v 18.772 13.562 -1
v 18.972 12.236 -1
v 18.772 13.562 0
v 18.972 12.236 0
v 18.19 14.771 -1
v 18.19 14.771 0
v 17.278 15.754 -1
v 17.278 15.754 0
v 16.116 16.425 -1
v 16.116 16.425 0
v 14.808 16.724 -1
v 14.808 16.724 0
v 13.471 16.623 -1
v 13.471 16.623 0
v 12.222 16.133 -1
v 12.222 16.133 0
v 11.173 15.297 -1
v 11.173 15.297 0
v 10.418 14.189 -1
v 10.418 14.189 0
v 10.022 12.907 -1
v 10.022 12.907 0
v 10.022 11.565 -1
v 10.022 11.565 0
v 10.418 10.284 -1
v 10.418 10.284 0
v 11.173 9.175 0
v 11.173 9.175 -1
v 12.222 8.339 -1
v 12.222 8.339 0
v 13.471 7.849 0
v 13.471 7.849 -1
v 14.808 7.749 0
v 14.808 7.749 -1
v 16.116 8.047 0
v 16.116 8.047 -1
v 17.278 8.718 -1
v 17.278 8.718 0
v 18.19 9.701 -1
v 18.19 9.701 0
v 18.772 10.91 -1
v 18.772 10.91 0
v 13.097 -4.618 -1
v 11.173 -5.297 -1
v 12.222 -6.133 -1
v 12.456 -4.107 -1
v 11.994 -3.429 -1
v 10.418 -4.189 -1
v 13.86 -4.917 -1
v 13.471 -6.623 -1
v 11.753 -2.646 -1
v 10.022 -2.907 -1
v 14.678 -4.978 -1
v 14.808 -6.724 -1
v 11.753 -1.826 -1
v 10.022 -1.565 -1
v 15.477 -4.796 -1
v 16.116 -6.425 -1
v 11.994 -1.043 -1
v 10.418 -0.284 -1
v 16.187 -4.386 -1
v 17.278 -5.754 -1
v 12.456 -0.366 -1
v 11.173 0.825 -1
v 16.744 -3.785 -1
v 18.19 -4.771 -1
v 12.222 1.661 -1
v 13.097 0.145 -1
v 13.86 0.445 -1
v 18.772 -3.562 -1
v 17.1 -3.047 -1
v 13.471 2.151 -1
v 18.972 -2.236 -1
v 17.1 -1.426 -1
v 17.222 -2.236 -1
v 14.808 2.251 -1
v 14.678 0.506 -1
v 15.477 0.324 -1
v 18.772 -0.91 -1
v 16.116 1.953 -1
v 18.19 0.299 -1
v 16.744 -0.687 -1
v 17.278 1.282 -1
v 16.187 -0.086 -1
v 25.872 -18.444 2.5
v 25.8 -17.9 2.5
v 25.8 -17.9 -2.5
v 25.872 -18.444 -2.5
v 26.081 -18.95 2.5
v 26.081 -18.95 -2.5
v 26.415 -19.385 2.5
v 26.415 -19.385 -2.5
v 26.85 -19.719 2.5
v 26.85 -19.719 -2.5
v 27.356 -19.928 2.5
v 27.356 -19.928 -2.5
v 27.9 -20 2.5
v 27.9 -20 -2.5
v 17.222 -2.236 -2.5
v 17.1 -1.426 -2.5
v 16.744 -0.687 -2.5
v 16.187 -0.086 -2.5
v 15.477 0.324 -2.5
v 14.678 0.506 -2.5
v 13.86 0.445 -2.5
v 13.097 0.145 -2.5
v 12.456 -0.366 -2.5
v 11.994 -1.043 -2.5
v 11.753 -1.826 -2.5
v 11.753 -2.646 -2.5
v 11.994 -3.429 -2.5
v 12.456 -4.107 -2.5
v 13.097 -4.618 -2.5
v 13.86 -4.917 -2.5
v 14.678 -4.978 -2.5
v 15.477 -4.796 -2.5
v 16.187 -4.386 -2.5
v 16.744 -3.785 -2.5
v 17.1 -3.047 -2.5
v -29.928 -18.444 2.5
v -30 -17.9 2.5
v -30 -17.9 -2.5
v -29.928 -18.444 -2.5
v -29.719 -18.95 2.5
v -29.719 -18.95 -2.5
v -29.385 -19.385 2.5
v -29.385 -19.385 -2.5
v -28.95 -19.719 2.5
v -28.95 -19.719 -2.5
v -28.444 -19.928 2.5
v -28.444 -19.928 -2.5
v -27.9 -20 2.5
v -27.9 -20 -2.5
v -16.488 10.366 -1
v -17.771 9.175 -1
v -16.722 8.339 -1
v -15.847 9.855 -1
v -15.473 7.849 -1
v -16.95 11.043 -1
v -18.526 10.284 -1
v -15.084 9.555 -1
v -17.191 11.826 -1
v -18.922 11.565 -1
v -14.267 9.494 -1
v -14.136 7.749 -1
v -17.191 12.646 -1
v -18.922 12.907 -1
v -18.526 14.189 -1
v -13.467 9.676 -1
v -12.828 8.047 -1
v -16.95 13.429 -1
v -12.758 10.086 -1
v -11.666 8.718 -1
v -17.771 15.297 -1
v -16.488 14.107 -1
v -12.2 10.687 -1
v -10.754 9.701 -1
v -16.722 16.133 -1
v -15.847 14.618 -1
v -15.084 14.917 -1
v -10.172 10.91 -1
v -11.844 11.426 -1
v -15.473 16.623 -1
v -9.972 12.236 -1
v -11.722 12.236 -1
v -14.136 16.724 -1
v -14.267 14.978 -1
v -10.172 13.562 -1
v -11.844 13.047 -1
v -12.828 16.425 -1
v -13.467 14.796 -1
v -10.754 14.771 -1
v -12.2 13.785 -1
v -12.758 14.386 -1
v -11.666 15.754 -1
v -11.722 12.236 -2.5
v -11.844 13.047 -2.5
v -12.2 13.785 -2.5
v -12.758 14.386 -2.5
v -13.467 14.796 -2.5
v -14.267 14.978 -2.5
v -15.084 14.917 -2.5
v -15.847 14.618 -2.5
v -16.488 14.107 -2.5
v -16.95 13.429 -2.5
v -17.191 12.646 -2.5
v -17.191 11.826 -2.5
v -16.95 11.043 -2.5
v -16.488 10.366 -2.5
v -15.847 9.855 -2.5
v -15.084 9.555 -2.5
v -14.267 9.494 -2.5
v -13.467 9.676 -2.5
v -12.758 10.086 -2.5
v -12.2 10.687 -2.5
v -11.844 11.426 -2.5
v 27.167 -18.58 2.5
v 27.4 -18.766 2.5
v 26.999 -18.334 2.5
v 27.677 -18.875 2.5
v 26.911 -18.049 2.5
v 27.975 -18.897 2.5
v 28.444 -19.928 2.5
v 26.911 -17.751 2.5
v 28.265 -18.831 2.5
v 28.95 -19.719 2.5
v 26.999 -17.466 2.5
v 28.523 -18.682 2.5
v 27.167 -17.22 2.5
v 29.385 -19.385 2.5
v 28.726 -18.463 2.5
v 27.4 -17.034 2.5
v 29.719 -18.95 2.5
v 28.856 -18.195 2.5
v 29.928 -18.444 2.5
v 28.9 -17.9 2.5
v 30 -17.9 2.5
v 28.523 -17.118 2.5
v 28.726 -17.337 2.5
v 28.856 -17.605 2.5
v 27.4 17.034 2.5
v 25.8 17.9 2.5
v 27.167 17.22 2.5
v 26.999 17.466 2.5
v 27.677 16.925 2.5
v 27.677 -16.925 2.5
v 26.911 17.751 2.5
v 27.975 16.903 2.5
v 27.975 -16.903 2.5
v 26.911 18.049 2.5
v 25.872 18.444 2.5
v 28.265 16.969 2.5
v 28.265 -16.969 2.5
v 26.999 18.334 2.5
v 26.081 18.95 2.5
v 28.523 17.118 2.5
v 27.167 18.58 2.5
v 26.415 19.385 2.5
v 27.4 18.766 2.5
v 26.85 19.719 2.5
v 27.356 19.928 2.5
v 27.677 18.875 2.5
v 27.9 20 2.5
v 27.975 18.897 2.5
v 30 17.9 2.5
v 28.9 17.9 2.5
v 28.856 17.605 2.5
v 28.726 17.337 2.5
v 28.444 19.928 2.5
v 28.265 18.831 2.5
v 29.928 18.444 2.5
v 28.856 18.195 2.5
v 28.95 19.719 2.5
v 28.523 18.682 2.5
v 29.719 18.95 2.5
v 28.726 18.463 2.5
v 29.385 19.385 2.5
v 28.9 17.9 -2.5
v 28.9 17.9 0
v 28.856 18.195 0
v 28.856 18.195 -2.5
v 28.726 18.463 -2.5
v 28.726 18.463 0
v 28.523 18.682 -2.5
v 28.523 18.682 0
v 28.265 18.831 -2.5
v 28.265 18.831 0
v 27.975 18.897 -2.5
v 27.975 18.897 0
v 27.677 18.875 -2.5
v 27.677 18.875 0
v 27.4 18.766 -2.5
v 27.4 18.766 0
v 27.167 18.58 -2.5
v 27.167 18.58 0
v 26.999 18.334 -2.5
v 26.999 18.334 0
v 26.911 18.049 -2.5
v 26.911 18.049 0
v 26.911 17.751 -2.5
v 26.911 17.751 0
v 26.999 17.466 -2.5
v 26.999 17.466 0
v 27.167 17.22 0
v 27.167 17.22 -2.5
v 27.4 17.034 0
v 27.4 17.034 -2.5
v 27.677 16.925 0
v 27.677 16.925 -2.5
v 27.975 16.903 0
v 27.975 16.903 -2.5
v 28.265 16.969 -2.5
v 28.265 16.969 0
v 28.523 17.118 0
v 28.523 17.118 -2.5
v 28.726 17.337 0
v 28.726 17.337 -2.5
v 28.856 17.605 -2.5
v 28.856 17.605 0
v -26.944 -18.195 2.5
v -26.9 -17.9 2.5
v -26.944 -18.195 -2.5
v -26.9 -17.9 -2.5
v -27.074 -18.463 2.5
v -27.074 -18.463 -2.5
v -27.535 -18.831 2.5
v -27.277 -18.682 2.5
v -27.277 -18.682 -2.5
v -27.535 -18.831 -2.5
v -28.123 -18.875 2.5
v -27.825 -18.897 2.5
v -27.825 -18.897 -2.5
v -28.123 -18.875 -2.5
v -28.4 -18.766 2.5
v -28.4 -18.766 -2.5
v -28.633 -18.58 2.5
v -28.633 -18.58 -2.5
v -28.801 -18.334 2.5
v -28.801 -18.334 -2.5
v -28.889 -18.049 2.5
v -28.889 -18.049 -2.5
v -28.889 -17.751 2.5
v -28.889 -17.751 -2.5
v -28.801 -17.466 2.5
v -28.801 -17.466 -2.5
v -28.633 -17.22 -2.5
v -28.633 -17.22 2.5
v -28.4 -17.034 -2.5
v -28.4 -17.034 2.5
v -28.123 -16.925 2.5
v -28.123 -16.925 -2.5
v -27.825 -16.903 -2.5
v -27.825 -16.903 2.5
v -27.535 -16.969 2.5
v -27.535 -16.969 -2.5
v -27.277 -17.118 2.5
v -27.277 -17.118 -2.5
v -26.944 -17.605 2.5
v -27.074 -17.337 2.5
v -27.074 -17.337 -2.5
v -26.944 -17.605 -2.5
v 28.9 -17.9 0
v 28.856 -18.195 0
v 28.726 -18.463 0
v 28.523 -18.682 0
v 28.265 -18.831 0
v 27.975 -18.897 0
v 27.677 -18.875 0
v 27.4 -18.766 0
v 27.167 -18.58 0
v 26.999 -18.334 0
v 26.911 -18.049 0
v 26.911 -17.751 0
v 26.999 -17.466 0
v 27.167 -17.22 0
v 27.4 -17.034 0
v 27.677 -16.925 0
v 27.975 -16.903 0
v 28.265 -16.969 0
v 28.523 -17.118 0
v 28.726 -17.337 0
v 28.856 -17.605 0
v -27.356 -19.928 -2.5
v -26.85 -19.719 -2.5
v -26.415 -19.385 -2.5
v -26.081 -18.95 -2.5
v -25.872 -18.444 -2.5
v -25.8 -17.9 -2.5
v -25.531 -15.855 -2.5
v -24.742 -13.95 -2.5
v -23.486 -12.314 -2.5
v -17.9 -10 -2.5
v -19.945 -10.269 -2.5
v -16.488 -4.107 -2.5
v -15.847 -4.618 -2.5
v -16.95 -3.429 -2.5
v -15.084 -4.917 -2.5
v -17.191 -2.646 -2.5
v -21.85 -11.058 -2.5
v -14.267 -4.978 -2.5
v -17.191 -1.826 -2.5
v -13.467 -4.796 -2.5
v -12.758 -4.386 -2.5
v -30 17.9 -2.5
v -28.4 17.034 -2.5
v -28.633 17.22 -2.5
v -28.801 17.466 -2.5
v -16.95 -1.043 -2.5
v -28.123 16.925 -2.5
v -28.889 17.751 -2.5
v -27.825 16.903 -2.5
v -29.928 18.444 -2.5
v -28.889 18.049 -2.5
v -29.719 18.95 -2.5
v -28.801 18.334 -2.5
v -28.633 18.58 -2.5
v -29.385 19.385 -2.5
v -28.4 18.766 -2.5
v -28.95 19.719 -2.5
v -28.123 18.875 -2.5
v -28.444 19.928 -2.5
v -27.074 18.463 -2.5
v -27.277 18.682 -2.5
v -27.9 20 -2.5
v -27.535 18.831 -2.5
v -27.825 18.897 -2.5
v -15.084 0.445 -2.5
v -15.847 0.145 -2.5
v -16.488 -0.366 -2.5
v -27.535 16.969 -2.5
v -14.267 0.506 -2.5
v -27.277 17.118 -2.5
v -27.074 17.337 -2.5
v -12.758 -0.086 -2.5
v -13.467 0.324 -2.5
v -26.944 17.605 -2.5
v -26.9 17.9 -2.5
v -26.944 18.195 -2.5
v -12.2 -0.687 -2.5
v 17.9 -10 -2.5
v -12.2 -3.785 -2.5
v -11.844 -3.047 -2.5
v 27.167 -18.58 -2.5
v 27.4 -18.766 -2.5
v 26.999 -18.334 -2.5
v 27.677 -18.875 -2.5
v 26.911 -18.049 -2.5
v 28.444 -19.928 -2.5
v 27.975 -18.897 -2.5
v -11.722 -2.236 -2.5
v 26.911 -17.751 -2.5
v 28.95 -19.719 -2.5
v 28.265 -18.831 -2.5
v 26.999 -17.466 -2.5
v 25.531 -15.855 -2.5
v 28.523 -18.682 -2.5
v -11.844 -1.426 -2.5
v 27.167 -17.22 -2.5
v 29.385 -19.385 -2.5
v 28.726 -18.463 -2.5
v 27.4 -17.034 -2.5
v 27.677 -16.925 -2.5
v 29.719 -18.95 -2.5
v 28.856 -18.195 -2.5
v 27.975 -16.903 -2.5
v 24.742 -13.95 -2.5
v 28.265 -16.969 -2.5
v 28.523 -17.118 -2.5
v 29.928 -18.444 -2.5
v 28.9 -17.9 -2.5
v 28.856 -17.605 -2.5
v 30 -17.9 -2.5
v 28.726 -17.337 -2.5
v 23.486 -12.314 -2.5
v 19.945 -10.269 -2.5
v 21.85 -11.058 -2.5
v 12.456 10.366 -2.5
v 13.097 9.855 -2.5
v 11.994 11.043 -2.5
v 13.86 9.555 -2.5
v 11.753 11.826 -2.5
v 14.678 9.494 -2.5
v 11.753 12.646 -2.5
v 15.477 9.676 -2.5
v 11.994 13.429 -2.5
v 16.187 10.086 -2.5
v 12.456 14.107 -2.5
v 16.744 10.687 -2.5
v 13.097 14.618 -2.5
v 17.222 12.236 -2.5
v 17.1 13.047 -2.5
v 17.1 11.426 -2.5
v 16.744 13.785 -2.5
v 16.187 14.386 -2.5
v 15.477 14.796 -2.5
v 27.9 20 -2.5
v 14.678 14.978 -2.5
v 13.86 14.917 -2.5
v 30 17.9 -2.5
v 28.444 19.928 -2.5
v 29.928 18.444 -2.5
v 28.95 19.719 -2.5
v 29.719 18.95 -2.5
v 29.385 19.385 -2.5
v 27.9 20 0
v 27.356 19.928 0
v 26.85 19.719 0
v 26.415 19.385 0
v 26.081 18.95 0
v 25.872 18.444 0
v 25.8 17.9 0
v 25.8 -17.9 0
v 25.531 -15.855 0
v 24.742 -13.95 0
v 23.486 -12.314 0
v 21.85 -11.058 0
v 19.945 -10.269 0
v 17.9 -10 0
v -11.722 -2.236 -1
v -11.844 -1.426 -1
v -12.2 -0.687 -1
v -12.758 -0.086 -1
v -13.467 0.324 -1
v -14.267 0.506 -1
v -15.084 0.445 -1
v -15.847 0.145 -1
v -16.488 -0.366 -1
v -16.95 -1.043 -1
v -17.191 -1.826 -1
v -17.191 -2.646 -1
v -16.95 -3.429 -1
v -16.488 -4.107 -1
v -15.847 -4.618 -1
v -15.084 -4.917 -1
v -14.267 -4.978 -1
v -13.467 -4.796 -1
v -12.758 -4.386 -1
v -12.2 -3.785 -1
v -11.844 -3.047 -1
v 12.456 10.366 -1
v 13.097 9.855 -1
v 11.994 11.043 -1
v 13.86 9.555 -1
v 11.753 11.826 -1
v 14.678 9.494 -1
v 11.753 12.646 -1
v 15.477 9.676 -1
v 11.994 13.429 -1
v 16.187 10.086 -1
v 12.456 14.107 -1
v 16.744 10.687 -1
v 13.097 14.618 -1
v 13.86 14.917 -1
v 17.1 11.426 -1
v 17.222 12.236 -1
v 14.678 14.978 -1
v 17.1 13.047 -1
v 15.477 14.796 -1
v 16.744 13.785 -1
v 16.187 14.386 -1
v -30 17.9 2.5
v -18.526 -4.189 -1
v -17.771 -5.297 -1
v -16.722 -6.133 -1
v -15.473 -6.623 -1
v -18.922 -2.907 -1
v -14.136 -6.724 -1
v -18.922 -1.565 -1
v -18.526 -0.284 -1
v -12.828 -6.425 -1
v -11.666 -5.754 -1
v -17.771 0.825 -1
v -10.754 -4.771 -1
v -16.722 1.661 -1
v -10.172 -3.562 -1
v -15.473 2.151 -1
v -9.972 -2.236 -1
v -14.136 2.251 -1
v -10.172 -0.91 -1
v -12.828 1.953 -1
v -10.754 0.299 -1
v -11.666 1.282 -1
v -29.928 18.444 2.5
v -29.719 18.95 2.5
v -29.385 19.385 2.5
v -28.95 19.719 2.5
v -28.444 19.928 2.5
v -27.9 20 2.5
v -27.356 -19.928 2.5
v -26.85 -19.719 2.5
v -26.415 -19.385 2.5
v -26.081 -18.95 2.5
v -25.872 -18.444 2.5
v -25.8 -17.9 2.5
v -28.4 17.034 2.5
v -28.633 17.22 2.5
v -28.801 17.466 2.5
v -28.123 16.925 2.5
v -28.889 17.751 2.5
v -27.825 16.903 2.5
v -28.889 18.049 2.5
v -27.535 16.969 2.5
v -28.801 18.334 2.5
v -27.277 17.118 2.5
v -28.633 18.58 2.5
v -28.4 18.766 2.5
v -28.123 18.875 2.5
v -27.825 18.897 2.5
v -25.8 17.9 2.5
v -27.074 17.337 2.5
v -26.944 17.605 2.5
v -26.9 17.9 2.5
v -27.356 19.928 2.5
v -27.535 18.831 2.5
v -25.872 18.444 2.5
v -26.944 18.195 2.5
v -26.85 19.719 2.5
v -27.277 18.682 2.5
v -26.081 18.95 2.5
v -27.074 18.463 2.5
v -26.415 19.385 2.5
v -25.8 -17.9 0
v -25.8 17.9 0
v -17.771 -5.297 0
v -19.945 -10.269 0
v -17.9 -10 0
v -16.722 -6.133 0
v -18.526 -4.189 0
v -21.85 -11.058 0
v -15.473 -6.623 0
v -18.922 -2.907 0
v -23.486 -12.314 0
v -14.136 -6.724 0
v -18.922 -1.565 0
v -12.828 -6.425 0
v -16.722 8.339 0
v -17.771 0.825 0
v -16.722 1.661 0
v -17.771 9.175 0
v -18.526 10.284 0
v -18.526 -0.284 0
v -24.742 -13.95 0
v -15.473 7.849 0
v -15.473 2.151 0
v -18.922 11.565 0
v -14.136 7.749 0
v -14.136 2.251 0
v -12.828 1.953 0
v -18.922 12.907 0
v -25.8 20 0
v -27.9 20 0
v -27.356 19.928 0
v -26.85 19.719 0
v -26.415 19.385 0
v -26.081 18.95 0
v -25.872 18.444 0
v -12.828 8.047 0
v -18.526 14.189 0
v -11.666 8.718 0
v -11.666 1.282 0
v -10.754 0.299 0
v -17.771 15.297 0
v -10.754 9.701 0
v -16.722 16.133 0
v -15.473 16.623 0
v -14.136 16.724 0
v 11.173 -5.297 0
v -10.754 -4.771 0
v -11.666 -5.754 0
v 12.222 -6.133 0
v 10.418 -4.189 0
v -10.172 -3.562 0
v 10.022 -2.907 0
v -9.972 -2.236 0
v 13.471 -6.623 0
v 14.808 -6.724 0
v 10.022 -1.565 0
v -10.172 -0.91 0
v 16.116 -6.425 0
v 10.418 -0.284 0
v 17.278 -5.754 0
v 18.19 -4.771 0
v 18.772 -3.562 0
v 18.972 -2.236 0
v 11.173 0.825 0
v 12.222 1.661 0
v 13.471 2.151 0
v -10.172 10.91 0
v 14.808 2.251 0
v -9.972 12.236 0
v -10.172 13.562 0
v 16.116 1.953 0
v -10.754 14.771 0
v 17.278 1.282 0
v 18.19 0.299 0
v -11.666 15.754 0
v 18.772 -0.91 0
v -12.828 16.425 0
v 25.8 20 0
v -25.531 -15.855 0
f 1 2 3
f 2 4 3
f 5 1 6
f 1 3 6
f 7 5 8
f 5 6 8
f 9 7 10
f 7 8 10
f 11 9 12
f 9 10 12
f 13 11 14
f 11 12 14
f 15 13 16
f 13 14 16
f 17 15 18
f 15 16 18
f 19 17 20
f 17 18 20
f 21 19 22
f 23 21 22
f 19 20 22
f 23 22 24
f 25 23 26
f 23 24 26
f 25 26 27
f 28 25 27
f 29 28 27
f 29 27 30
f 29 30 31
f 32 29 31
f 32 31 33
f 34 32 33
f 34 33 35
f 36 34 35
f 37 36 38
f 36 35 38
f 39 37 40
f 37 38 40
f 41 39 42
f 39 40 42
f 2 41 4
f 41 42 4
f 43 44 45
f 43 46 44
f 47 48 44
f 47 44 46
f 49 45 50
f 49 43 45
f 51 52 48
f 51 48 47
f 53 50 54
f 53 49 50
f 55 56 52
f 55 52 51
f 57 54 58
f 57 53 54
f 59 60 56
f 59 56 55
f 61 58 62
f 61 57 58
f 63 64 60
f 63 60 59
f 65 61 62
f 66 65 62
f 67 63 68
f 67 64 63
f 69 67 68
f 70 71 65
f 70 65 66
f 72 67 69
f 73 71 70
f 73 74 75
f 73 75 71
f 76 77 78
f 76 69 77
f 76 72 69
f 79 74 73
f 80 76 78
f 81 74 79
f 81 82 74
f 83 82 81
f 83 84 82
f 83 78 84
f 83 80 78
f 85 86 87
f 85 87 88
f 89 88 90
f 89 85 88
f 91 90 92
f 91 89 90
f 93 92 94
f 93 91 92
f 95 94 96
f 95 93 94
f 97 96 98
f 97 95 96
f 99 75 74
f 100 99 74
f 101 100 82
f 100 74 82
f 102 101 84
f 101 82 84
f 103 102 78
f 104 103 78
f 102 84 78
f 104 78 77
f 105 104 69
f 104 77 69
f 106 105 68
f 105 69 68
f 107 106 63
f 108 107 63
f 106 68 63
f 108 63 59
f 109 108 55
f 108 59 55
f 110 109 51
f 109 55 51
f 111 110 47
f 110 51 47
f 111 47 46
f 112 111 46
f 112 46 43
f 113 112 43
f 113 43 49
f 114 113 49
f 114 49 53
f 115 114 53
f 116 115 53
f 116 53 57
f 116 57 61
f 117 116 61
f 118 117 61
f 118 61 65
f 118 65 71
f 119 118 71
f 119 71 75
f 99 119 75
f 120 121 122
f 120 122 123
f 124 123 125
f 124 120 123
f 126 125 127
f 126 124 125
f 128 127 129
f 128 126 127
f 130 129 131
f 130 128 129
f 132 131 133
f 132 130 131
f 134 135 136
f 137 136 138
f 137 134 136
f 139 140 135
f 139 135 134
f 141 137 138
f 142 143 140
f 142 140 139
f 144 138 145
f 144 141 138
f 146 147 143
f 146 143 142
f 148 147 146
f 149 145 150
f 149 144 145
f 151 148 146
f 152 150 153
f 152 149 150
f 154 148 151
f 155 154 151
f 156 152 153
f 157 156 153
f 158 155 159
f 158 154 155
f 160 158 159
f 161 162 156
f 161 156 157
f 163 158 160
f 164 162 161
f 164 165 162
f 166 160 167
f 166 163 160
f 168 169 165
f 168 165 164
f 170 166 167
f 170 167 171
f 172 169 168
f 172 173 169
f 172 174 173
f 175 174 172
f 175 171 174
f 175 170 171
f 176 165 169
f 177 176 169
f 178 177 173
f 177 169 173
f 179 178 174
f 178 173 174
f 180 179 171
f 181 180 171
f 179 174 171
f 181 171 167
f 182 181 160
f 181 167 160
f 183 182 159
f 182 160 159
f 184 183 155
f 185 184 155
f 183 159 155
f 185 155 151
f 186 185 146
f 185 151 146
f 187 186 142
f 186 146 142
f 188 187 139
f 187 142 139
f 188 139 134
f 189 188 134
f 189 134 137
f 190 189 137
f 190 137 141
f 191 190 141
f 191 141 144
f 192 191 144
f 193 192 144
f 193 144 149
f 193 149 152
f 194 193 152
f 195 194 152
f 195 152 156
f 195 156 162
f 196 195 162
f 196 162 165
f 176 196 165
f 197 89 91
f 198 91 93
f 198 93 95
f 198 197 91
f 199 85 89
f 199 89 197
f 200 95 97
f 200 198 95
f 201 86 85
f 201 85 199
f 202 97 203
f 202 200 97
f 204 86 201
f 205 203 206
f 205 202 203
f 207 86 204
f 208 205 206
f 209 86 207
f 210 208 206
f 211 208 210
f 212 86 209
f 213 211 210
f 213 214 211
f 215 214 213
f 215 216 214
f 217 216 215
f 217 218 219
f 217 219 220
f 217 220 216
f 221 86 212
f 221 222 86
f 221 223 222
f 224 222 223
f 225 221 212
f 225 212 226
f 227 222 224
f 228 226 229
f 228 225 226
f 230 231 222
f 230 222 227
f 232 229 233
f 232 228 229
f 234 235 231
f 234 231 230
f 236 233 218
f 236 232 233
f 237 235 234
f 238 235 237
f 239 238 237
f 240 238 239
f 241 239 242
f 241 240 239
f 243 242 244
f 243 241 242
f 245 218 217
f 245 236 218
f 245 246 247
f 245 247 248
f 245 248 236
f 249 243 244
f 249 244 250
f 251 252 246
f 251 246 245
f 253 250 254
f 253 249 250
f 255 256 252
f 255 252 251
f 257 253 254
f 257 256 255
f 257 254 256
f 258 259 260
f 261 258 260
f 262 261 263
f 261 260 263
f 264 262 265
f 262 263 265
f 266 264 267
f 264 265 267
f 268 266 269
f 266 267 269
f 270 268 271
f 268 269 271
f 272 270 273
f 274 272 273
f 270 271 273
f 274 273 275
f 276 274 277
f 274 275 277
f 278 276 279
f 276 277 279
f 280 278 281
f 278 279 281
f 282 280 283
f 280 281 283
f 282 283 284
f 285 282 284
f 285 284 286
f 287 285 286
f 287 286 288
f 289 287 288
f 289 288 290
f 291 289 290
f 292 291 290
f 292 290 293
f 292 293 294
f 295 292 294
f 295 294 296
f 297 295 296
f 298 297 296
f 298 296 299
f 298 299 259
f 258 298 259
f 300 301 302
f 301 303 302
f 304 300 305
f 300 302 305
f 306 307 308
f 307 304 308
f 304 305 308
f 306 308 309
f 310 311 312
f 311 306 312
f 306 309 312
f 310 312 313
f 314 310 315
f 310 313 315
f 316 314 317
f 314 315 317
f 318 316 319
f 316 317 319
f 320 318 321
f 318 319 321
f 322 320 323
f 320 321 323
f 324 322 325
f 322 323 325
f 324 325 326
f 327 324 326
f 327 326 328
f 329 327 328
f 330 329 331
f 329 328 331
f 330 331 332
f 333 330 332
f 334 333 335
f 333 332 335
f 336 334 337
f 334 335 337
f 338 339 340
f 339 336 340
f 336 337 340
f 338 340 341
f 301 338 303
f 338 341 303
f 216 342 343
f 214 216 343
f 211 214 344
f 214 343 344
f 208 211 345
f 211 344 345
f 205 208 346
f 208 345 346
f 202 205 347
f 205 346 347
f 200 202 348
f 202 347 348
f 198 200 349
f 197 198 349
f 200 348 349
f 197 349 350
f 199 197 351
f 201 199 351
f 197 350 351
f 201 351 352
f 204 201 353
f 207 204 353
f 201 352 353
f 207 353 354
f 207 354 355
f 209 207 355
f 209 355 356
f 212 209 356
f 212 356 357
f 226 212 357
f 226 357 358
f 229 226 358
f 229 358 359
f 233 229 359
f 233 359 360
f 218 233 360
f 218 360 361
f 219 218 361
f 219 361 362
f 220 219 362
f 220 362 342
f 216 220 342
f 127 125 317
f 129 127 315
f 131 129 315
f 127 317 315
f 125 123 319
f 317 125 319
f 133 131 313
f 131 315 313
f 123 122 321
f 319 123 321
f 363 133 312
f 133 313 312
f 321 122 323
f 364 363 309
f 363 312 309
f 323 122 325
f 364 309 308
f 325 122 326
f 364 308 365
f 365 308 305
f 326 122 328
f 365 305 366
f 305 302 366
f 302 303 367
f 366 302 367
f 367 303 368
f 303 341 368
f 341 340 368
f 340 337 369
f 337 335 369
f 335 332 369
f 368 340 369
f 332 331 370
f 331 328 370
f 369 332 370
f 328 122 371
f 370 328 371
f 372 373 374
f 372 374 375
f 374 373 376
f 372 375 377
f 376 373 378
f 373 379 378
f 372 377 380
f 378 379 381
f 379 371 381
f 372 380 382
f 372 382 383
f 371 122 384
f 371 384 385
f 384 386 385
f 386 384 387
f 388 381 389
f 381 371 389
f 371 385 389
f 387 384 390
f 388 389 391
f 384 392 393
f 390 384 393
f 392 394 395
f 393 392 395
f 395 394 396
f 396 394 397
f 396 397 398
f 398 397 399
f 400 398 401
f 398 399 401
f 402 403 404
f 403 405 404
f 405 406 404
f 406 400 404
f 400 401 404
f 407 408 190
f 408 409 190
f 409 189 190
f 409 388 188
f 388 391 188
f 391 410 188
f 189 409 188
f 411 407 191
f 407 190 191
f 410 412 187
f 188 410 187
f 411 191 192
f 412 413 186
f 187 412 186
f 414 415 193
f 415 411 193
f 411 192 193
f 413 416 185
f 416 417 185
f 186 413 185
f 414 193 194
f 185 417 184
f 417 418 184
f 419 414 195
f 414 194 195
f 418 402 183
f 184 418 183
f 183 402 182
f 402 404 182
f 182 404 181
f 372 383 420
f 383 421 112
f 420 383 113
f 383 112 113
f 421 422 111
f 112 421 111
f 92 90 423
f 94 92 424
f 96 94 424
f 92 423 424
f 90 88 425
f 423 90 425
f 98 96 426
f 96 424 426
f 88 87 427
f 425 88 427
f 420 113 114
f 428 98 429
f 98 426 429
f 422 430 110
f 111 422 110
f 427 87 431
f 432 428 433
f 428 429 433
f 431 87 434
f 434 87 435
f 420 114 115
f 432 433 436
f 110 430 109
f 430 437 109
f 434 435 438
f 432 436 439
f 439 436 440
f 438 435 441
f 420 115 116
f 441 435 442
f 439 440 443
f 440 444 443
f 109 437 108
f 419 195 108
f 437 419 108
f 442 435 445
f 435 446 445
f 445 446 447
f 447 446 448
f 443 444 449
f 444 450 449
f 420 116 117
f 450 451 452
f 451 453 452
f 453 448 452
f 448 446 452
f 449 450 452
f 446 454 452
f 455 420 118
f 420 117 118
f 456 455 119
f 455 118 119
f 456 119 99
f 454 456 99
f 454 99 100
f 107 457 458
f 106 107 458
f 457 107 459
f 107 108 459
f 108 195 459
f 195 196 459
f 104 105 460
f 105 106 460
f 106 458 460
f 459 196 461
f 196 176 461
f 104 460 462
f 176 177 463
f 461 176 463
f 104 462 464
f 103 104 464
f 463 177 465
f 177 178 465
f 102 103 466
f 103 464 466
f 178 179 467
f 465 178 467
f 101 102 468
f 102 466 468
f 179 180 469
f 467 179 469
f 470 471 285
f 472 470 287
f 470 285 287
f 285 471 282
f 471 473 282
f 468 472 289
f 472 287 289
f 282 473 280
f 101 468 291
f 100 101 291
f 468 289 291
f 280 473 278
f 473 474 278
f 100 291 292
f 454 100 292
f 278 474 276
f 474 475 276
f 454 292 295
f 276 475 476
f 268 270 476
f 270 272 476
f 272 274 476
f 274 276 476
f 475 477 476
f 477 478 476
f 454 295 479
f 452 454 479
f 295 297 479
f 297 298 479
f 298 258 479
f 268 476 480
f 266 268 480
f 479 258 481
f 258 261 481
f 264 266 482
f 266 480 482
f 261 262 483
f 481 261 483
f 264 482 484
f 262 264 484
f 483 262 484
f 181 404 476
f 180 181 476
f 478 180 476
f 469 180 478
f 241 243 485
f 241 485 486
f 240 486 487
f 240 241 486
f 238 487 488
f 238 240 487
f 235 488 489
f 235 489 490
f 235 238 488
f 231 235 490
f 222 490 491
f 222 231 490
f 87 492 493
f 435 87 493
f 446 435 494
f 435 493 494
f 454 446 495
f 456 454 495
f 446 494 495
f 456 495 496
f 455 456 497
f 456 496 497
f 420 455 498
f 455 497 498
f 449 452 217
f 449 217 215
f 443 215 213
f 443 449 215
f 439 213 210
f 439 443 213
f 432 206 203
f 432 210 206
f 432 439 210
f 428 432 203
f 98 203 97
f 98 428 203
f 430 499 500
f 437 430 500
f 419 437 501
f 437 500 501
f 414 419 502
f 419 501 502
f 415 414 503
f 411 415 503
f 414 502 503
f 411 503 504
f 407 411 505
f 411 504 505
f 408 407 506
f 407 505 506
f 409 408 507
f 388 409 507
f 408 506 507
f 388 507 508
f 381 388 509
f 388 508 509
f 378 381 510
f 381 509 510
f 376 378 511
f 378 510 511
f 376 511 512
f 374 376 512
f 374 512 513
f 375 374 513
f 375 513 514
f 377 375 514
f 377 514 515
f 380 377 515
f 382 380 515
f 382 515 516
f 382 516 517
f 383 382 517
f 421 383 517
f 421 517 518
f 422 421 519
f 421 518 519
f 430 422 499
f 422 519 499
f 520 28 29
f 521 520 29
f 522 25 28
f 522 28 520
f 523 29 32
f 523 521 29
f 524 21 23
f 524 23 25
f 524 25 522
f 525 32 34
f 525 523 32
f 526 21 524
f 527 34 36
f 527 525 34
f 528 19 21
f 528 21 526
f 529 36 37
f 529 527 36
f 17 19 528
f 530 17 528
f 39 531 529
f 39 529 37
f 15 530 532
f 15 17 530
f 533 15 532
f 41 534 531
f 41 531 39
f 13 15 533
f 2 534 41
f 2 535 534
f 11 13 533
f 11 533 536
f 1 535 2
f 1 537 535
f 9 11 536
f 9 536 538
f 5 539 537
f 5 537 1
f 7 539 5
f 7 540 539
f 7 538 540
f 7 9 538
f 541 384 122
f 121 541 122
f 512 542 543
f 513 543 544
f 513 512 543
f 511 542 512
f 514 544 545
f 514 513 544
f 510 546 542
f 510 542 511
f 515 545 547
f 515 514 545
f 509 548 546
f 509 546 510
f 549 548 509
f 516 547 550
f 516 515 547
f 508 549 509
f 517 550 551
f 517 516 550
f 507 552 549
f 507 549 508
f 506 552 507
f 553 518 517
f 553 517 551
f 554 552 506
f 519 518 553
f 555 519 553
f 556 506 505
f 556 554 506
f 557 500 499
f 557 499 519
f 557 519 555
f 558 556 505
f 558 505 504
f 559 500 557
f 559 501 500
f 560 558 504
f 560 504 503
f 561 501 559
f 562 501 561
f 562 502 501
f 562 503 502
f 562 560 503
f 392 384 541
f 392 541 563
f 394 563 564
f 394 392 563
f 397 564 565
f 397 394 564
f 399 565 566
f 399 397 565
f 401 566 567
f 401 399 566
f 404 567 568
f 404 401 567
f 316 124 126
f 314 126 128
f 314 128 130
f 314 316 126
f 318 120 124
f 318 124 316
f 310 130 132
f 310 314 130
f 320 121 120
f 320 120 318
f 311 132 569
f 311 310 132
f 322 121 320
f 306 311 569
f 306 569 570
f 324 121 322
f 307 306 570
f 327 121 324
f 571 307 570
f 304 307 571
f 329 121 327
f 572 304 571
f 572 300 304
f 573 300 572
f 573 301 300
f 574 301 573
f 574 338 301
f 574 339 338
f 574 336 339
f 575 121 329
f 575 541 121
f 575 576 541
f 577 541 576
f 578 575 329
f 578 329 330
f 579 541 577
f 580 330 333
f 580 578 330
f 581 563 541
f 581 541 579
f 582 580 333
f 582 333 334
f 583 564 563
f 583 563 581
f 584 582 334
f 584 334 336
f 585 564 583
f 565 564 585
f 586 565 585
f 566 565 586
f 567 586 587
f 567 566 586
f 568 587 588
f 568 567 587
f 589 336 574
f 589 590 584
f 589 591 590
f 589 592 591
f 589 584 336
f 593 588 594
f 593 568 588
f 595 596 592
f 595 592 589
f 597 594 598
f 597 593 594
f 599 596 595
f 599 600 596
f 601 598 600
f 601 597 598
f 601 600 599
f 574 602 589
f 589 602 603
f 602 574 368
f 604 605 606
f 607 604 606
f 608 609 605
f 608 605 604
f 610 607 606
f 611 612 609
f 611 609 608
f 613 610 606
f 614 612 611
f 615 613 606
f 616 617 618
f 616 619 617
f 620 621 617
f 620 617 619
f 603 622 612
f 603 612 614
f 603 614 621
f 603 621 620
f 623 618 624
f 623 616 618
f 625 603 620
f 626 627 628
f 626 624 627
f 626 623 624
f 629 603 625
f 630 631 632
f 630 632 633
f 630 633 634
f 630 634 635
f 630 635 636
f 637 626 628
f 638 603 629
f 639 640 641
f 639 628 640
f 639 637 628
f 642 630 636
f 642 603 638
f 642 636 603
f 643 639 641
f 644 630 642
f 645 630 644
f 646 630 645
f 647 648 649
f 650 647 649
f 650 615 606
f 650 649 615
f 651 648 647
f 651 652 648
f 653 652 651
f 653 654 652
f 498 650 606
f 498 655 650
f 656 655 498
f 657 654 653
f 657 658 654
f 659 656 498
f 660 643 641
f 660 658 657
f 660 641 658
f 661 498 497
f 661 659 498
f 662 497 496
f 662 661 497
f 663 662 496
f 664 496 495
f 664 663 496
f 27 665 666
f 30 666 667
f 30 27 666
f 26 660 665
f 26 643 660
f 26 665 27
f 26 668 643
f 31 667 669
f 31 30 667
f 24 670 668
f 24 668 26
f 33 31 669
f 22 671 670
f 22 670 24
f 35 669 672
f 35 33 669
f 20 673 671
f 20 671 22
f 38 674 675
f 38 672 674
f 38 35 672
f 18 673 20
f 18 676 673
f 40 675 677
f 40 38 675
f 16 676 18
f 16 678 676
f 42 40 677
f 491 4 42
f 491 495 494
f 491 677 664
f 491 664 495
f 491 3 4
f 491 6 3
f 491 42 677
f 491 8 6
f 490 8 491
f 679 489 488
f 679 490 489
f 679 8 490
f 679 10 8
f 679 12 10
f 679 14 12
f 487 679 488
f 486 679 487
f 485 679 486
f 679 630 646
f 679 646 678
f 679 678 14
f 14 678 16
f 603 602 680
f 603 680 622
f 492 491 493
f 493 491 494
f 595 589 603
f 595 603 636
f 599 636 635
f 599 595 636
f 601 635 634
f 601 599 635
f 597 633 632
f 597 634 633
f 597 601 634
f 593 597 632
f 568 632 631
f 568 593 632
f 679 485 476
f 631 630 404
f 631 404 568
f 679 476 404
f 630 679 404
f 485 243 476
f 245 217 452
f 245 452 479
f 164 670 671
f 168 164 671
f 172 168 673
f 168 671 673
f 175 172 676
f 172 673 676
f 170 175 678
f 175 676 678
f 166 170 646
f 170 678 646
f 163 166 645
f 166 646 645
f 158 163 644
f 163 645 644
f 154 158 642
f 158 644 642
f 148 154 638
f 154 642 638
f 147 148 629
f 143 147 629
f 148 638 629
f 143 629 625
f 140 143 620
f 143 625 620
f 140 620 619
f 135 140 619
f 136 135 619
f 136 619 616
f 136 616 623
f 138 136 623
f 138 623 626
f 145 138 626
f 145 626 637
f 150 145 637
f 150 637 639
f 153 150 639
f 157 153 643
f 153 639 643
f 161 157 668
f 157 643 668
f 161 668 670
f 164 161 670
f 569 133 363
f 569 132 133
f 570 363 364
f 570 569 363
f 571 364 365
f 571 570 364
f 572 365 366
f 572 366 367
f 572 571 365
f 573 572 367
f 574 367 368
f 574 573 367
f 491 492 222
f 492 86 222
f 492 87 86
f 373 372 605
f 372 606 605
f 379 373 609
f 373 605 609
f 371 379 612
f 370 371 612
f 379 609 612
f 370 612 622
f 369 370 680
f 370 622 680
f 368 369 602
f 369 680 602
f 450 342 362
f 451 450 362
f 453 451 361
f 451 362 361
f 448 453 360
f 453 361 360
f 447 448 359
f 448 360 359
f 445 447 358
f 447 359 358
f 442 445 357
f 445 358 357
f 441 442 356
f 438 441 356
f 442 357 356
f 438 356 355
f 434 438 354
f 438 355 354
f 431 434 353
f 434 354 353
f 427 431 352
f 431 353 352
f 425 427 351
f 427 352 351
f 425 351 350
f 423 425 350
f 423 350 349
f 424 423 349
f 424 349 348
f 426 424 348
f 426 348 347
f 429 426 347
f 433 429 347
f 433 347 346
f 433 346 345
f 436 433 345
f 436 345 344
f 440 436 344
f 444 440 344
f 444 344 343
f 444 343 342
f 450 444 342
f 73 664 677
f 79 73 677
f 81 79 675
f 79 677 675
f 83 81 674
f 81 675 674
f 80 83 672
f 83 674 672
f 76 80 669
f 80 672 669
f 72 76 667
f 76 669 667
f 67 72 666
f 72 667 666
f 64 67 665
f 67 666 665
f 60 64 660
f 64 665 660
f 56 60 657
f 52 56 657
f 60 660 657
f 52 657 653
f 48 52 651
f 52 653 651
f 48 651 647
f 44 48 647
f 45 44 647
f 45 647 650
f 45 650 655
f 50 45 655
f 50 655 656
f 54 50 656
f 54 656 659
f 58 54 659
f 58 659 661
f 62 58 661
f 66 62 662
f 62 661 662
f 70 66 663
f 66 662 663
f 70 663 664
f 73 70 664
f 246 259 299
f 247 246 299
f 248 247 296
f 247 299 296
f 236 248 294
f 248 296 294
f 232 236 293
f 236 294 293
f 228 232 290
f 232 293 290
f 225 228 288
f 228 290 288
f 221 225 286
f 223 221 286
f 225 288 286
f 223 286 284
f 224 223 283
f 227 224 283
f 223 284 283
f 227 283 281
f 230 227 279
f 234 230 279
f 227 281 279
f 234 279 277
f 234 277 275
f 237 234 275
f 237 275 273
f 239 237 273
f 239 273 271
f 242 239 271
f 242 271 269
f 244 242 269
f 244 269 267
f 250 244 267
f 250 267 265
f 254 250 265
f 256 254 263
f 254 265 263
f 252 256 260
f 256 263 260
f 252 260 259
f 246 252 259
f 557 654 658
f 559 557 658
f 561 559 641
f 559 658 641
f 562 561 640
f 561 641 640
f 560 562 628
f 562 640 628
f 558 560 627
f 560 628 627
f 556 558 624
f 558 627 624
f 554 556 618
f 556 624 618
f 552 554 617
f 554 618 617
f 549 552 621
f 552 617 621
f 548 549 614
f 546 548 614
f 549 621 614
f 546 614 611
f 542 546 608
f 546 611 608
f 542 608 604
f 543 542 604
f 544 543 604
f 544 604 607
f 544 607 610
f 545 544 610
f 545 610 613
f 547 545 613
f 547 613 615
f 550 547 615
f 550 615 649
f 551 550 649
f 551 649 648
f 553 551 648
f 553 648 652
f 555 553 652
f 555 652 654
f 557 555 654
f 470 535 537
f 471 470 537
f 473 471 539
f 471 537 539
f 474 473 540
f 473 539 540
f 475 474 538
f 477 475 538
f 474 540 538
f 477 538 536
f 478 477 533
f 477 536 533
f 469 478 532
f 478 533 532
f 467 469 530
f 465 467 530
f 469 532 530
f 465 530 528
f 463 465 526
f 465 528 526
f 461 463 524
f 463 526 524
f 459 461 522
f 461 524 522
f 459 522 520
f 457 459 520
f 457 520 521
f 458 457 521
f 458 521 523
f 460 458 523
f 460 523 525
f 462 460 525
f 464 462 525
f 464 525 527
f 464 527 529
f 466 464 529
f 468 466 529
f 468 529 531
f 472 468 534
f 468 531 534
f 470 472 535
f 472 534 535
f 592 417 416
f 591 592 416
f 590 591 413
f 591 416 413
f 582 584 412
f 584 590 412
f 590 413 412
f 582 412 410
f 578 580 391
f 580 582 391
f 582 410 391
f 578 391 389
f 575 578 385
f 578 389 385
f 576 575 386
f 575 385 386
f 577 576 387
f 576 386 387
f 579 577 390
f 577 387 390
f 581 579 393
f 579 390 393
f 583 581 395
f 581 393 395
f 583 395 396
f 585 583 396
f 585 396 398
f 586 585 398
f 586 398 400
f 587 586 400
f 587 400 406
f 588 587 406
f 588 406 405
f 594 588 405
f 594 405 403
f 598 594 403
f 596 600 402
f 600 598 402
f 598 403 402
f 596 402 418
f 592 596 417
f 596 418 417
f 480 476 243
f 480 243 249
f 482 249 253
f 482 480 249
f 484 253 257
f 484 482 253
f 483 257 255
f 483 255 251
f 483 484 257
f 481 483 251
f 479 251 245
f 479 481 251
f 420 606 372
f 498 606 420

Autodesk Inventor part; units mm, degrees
ref_plane "YZ Plane" through (0, 0, 0) normal (1, 0, 0) x (0, 1, 0)
ref_plane "XZ Plane" through (0, 0, 0) normal (0, 1, 0) x (-1, 0, 0)
ref_plane "XY Plane" through (0, 0, 0) normal (0, 0, 1) x (1, 0, 0)
sketch "Sketch1" plane through (0, 0, 0) normal (0, 0, 1) x (1, 0, 0)
  line L0 (-30, -20) -> (30, -20)
  line L1 (30, -20) -> (30, 20)
  line L2 (30, 20) -> (-30, 20)
  line L3 (-30, 20) -> (-30, -20)
  line L4 (-30, -20) -> (30, 20) construction
  line L5 (30, -20) -> (-30, 20) construction
  circle A0 centre (-27.9, 17.9) radius 2.1 construction
  circle A1 centre (-27.9, 17.9) radius 1
  line L6 (0, 0) -> (-34.17, 0) construction
  line L7 (0, 33.0444) -> (0, 0) construction
  circle A2 centre (-27.9, -17.9) radius 1
  circle A3 centre (27.9, 17.9) radius 1
  circle A4 centre (27.9, -17.9) radius 1
  line L8 (-25.8, -20) -> (-25.8, 20)
  line L9 (25.8, -20) -> (25.8, 20)
  line L10 (-27.9, 17.9) -> (27.9, 17.9)
  line L11 (27.9, -17.9) -> (-27.9, -17.9)
  circle A5 centre (-14.4721, 12.2361) radius 2.75
  circle A6 centre (-14.4721, 12.2361) radius 4.5
  circle A7 centre (-14.4721, 12.2361) radius 5 construction
  circle A8 centre (-10, 10) radius 2.5 construction
  line L12 (-34.3347, 5) -> (2.7365, 5) construction
  line L13 (-14.4721, 12.2361) -> (0, 5) construction
  circle A9 centre (-14.4721, -2.2361) radius 2.75
  circle A10 centre (-14.4721, -2.2361) radius 4.5
  circle A11 centre (14.4721, 12.2361) radius 2.75
  circle A12 centre (14.4721, 12.2361) radius 4.5
  circle A13 centre (14.4721, -2.2361) radius 2.75
  circle A14 centre (14.4721, -2.2361) radius 4.5
  line L14 (-30, -10) -> (30, -10)
  arc A15 (-17.9, -10) -> (-25.8, -17.9) centre (-17.9, -17.9) ccw
  arc A16 (25.8, -17.9) -> (17.9, -10) centre (17.9, -17.9) ccw
  point P0 (-25.8, 17.9)
  point P1 (25.8, 17.9)
  point P2 (25.8, 20)
  dimension "d0" = 60
  dimension "d1" = 40
  dimension "d2" = 1.1
  dimension "d3" = 2
  dimension "d8" = 9
  dimension "d9" = 5.5
  dimension "d10" = 10
  dimension "d20" = 5
  dimension "d22" = 5
  dimension "d25" = 10
  dimension "d26" = 10
  dimension "d27" = 5
extrude "Extrusion2" add sketch "Sketch1" along normal blind 2.5 contours L3 L14 L8 L0 | L3 L2 L8 L14 | L9 L14 L1 L0 | L14 L9 L2 L1
extrude "Extrusion3" add sketch "Sketch1" against normal blind 2.5 contours L3 L14 L8 L0 | L3 L2 L8 L14 | L9 L14 L1 L0 | L8 L14 A15 | L8 L10 L9 L14 | A16 L14 L9 | L2 L9 L10 L8 | L14 L9 L2 L1 | A6 | A10 | A12 | A14
extrude "Extrusion4" cut sketch "Sketch1" along normal blind 2.5 and the other way blind 1 contours A5 | A6 | A9 | A10 | A11 | A12 | A13 | A14
fillet "Fillet1" radius 2.1 8 edges at (-30, -20, 0) (-30, 20, 0) (30, -20, 0) (30, 20, 0) (-25.8, -20, 0) (-25.8, 20, 1.25) (25.8, 20, 1.25) (25.8, -20, 0)
properties part number "pcb"
